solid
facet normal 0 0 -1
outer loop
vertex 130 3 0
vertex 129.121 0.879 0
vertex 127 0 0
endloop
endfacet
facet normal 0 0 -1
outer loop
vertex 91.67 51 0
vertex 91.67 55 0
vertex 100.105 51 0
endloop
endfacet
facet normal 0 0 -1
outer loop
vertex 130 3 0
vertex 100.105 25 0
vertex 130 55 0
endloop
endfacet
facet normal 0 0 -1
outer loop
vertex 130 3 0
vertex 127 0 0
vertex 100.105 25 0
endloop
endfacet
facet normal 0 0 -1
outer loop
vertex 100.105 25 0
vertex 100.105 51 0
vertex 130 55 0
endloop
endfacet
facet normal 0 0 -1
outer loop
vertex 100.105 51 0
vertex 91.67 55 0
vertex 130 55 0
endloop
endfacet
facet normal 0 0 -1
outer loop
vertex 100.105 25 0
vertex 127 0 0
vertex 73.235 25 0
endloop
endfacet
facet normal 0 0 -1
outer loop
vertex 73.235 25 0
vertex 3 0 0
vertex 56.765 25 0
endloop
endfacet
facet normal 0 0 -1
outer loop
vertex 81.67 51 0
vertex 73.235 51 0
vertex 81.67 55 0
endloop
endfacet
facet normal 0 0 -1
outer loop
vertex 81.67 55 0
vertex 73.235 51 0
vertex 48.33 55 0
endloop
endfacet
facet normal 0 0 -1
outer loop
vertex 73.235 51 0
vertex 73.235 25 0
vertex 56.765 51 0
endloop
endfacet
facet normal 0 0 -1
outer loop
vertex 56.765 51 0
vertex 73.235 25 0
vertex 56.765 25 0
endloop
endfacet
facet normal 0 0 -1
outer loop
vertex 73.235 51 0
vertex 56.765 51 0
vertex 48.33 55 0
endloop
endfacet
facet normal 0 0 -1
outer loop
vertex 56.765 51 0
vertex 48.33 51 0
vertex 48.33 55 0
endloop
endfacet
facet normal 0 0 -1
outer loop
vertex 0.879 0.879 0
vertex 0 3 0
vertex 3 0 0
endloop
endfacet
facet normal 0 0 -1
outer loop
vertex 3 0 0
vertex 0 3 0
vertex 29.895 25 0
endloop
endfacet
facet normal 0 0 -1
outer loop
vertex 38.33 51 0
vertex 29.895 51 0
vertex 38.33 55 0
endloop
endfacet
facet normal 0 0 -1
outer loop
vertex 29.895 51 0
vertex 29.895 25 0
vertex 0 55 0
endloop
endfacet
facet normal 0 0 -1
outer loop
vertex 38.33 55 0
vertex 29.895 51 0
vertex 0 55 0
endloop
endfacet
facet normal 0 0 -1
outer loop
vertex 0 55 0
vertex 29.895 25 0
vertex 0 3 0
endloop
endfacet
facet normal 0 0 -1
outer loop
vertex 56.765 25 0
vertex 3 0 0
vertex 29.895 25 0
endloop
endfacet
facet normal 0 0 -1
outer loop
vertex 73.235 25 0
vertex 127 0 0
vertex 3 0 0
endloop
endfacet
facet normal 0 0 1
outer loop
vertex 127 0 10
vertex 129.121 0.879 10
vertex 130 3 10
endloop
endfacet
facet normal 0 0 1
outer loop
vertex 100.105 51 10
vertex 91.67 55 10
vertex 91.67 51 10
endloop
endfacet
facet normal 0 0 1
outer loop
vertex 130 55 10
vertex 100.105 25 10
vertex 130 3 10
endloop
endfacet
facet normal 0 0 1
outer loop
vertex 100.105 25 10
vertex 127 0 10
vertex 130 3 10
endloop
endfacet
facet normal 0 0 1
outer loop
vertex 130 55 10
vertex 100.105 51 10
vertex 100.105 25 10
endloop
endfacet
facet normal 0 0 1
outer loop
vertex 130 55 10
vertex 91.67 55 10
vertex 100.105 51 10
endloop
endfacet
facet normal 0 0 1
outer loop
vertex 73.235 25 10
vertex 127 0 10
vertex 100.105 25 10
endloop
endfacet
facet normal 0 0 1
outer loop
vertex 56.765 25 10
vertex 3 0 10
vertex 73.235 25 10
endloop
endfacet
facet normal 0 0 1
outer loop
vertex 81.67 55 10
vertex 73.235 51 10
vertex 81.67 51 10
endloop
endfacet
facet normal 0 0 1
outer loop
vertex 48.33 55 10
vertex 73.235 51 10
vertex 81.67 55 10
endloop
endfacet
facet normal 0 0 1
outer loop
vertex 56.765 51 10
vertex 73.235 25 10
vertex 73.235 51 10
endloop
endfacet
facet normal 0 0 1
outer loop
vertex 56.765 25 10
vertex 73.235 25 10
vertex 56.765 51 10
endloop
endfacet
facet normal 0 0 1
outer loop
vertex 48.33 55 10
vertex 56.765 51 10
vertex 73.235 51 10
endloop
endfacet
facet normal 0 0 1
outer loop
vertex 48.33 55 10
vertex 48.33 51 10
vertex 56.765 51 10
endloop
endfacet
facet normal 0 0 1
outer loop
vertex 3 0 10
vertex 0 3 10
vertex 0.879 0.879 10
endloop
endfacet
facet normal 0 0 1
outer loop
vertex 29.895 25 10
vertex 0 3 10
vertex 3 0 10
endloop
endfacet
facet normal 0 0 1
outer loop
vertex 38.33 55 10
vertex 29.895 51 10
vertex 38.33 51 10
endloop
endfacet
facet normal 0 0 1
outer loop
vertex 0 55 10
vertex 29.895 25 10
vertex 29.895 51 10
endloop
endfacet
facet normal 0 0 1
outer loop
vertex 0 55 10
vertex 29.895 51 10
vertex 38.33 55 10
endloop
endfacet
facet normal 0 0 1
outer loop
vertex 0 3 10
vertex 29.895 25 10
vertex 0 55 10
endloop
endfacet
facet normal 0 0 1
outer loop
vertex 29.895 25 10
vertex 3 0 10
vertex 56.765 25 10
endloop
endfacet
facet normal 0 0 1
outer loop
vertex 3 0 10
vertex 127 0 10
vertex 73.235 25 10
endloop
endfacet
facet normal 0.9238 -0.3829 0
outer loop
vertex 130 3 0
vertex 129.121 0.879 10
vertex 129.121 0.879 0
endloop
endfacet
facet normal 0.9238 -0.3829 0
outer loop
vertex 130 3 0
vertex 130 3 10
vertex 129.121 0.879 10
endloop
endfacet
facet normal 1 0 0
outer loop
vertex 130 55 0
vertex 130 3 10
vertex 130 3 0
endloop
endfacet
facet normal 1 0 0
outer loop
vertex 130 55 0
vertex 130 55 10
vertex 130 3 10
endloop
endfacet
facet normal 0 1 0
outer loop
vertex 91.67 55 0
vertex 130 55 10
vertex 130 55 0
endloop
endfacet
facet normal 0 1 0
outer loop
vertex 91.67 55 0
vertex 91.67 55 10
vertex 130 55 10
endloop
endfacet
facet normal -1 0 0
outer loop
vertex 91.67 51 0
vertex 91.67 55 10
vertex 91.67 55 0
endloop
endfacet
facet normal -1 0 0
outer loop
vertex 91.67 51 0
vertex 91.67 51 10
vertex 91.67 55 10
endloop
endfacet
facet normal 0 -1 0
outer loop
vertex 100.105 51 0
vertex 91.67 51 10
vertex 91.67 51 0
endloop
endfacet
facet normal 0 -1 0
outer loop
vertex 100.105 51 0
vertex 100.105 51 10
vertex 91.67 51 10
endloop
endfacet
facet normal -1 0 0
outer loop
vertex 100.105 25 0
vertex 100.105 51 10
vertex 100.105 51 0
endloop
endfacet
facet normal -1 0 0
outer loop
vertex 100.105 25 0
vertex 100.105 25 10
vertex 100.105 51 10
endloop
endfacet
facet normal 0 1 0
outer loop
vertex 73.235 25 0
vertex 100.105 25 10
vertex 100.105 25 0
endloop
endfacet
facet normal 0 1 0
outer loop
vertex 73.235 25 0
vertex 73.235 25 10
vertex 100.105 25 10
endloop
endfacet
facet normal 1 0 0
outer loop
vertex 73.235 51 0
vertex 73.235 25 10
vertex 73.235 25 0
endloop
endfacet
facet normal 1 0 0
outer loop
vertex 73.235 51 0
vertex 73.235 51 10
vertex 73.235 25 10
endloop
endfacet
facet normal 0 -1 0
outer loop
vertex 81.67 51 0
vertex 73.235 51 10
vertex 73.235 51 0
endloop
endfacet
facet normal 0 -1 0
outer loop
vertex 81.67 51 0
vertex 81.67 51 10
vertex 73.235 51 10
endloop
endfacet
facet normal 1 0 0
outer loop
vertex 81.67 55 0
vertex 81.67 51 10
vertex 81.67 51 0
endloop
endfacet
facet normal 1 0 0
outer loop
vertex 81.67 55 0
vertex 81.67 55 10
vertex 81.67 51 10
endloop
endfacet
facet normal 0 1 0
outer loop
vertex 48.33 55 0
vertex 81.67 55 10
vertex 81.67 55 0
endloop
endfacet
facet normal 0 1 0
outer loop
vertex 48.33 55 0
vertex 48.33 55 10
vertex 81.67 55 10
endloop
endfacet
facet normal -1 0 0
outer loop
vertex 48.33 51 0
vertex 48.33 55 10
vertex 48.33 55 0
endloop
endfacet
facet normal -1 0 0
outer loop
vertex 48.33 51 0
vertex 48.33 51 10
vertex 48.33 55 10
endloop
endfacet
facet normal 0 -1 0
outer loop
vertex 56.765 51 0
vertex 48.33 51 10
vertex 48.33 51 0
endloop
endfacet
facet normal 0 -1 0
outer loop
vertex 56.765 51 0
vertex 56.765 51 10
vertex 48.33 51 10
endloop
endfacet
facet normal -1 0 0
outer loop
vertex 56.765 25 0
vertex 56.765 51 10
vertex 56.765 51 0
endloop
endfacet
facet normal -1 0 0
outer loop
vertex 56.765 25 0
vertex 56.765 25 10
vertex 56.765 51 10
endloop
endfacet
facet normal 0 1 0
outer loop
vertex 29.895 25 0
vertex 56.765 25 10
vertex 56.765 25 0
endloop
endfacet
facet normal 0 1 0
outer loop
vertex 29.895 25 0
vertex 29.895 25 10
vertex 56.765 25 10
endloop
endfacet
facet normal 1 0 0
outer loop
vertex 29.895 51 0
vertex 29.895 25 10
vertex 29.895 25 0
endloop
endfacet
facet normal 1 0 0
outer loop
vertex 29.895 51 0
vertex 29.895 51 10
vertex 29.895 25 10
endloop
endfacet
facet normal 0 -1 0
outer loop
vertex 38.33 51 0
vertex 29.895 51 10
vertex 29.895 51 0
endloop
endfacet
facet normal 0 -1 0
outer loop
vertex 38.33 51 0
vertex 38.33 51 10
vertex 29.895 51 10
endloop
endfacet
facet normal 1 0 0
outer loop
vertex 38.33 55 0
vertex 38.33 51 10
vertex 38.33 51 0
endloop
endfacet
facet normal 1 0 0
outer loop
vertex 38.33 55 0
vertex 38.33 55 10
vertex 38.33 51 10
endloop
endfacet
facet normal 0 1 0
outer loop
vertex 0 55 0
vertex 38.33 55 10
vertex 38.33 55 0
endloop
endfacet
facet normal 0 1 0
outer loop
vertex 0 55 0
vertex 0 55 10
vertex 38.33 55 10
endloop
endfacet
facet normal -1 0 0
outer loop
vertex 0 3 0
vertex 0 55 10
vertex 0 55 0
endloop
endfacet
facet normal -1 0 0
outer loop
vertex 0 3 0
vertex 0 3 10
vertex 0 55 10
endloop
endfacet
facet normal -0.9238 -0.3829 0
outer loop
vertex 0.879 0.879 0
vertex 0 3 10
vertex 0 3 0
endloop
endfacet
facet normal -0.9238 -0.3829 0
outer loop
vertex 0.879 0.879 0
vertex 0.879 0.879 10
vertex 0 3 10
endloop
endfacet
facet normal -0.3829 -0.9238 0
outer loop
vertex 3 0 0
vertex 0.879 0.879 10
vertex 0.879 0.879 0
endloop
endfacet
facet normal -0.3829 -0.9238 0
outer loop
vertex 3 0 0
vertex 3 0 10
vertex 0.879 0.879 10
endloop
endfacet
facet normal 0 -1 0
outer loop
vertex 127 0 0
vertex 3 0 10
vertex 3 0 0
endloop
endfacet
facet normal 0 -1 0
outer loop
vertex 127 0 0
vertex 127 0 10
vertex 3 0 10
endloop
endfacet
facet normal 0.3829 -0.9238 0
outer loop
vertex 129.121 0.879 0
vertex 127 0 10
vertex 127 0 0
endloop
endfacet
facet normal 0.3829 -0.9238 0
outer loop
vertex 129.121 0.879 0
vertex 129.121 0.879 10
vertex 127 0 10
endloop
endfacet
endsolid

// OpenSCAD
$fn = 32;

// ----------------------------------------------------------------------
// Window plate: 130 x 55 mm, 2 open windows
// ----------------------------------------------------------------------

// --- parameters (mm) ---
profile_height = 10;      // extrusion height
profile_points = 24;      // points of the closed outline

profile = [[0, 3], [0.879, 0.879], [3, 0], [127, 0], [129.121, 0.879], [130, 3], [130, 55], [91.67, 55], [91.67, 51], [100.105, 51], [100.105, 25], [73.235, 25], [73.235, 51], [81.67, 51], [81.67, 55], [48.33, 55], [48.33, 51], [56.765, 51], [56.765, 25], [29.895, 25], [29.895, 51], [38.33, 51], [38.33, 55], [0, 55]];  // single closed polygon, 24 points, counter clockwise

// --- the one profile operation ---
linear_extrude(height = profile_height) polygon(points = profile);
